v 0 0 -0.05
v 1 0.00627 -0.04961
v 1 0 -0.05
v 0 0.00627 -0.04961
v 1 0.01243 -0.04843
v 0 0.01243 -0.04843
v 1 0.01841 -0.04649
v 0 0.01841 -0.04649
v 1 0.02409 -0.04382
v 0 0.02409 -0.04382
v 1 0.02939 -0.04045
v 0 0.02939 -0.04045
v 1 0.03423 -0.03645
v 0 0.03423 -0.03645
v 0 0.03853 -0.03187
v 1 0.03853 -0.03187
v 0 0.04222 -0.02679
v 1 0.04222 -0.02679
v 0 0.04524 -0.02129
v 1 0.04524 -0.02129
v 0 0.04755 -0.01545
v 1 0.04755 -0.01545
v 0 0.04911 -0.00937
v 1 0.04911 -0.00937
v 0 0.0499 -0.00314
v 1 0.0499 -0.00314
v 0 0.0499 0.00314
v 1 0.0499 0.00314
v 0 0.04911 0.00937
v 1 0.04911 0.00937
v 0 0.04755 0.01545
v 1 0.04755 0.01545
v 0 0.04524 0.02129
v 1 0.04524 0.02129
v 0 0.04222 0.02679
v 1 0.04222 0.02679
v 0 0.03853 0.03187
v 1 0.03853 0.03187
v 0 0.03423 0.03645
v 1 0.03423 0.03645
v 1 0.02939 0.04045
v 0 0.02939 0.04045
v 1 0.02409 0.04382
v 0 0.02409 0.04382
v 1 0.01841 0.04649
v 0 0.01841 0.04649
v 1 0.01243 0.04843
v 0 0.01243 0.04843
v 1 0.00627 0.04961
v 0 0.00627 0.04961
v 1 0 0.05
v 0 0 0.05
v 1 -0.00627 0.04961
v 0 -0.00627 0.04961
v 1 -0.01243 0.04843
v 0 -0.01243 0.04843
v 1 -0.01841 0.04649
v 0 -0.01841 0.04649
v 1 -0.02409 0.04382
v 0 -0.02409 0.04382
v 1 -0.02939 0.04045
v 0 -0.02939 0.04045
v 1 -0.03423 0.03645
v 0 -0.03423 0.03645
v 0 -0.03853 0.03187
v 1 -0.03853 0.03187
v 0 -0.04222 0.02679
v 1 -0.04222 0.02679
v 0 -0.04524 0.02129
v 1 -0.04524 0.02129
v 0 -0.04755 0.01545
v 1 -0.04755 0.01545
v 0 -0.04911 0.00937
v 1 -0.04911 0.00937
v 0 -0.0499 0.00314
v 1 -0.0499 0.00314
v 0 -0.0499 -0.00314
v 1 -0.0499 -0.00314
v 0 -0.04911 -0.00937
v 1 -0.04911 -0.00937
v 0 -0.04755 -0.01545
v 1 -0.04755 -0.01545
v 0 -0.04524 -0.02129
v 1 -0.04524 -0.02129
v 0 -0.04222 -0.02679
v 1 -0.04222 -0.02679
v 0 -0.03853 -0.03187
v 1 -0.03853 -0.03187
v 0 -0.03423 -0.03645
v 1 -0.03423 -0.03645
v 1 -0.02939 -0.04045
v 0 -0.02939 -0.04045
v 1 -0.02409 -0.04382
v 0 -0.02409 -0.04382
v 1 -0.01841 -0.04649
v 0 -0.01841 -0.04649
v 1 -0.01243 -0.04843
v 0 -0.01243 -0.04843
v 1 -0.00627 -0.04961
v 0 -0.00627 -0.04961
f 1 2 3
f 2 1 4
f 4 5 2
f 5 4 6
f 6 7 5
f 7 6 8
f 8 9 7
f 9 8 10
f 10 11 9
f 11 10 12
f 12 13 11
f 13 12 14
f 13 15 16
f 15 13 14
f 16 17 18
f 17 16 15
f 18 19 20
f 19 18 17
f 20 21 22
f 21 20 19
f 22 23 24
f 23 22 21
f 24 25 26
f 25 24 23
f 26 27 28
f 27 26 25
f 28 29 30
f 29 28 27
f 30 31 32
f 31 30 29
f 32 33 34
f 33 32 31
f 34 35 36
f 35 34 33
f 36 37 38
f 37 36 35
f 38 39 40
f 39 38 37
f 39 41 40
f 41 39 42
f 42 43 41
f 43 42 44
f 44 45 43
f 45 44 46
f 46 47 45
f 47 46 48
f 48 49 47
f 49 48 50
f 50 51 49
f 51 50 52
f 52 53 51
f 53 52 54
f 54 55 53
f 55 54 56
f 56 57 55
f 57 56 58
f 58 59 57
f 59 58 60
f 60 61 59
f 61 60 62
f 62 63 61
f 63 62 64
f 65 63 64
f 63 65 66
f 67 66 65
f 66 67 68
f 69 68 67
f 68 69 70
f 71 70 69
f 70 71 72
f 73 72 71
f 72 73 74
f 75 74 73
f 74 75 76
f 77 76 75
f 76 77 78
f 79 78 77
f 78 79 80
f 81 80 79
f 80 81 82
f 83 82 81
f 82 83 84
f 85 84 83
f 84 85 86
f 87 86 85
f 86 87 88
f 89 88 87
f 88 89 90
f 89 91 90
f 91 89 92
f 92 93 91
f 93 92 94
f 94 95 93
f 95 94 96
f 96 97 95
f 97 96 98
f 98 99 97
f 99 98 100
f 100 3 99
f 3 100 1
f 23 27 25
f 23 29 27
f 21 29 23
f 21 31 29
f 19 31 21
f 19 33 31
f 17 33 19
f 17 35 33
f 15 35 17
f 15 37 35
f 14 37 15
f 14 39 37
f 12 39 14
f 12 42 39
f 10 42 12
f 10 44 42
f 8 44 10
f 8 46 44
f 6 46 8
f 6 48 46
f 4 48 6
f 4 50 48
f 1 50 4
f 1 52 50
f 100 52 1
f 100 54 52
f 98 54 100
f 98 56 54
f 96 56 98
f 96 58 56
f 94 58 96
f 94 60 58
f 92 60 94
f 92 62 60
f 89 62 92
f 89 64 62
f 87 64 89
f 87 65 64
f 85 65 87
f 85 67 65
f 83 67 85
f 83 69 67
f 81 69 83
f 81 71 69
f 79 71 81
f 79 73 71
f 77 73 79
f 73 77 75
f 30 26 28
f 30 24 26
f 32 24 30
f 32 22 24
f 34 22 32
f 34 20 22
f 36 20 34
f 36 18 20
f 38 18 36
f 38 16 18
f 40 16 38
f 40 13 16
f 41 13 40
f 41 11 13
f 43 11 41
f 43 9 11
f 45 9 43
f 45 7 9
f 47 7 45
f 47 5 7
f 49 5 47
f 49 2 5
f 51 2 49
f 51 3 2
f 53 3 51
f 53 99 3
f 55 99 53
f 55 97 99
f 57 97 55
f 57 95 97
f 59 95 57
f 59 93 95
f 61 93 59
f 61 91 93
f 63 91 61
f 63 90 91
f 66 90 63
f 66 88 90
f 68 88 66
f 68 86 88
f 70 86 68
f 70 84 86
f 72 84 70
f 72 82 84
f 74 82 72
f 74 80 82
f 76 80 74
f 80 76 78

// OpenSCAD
$fn=50;  // REMOVE
LENGTH = 1;  // REMOVE
DO = 0.1; // REMOVE
rotate([0,90,0])
translate([0, 0, (LENGTH)/2])
cylinder(h = (LENGTH), r = (DO)/2, center = true);
